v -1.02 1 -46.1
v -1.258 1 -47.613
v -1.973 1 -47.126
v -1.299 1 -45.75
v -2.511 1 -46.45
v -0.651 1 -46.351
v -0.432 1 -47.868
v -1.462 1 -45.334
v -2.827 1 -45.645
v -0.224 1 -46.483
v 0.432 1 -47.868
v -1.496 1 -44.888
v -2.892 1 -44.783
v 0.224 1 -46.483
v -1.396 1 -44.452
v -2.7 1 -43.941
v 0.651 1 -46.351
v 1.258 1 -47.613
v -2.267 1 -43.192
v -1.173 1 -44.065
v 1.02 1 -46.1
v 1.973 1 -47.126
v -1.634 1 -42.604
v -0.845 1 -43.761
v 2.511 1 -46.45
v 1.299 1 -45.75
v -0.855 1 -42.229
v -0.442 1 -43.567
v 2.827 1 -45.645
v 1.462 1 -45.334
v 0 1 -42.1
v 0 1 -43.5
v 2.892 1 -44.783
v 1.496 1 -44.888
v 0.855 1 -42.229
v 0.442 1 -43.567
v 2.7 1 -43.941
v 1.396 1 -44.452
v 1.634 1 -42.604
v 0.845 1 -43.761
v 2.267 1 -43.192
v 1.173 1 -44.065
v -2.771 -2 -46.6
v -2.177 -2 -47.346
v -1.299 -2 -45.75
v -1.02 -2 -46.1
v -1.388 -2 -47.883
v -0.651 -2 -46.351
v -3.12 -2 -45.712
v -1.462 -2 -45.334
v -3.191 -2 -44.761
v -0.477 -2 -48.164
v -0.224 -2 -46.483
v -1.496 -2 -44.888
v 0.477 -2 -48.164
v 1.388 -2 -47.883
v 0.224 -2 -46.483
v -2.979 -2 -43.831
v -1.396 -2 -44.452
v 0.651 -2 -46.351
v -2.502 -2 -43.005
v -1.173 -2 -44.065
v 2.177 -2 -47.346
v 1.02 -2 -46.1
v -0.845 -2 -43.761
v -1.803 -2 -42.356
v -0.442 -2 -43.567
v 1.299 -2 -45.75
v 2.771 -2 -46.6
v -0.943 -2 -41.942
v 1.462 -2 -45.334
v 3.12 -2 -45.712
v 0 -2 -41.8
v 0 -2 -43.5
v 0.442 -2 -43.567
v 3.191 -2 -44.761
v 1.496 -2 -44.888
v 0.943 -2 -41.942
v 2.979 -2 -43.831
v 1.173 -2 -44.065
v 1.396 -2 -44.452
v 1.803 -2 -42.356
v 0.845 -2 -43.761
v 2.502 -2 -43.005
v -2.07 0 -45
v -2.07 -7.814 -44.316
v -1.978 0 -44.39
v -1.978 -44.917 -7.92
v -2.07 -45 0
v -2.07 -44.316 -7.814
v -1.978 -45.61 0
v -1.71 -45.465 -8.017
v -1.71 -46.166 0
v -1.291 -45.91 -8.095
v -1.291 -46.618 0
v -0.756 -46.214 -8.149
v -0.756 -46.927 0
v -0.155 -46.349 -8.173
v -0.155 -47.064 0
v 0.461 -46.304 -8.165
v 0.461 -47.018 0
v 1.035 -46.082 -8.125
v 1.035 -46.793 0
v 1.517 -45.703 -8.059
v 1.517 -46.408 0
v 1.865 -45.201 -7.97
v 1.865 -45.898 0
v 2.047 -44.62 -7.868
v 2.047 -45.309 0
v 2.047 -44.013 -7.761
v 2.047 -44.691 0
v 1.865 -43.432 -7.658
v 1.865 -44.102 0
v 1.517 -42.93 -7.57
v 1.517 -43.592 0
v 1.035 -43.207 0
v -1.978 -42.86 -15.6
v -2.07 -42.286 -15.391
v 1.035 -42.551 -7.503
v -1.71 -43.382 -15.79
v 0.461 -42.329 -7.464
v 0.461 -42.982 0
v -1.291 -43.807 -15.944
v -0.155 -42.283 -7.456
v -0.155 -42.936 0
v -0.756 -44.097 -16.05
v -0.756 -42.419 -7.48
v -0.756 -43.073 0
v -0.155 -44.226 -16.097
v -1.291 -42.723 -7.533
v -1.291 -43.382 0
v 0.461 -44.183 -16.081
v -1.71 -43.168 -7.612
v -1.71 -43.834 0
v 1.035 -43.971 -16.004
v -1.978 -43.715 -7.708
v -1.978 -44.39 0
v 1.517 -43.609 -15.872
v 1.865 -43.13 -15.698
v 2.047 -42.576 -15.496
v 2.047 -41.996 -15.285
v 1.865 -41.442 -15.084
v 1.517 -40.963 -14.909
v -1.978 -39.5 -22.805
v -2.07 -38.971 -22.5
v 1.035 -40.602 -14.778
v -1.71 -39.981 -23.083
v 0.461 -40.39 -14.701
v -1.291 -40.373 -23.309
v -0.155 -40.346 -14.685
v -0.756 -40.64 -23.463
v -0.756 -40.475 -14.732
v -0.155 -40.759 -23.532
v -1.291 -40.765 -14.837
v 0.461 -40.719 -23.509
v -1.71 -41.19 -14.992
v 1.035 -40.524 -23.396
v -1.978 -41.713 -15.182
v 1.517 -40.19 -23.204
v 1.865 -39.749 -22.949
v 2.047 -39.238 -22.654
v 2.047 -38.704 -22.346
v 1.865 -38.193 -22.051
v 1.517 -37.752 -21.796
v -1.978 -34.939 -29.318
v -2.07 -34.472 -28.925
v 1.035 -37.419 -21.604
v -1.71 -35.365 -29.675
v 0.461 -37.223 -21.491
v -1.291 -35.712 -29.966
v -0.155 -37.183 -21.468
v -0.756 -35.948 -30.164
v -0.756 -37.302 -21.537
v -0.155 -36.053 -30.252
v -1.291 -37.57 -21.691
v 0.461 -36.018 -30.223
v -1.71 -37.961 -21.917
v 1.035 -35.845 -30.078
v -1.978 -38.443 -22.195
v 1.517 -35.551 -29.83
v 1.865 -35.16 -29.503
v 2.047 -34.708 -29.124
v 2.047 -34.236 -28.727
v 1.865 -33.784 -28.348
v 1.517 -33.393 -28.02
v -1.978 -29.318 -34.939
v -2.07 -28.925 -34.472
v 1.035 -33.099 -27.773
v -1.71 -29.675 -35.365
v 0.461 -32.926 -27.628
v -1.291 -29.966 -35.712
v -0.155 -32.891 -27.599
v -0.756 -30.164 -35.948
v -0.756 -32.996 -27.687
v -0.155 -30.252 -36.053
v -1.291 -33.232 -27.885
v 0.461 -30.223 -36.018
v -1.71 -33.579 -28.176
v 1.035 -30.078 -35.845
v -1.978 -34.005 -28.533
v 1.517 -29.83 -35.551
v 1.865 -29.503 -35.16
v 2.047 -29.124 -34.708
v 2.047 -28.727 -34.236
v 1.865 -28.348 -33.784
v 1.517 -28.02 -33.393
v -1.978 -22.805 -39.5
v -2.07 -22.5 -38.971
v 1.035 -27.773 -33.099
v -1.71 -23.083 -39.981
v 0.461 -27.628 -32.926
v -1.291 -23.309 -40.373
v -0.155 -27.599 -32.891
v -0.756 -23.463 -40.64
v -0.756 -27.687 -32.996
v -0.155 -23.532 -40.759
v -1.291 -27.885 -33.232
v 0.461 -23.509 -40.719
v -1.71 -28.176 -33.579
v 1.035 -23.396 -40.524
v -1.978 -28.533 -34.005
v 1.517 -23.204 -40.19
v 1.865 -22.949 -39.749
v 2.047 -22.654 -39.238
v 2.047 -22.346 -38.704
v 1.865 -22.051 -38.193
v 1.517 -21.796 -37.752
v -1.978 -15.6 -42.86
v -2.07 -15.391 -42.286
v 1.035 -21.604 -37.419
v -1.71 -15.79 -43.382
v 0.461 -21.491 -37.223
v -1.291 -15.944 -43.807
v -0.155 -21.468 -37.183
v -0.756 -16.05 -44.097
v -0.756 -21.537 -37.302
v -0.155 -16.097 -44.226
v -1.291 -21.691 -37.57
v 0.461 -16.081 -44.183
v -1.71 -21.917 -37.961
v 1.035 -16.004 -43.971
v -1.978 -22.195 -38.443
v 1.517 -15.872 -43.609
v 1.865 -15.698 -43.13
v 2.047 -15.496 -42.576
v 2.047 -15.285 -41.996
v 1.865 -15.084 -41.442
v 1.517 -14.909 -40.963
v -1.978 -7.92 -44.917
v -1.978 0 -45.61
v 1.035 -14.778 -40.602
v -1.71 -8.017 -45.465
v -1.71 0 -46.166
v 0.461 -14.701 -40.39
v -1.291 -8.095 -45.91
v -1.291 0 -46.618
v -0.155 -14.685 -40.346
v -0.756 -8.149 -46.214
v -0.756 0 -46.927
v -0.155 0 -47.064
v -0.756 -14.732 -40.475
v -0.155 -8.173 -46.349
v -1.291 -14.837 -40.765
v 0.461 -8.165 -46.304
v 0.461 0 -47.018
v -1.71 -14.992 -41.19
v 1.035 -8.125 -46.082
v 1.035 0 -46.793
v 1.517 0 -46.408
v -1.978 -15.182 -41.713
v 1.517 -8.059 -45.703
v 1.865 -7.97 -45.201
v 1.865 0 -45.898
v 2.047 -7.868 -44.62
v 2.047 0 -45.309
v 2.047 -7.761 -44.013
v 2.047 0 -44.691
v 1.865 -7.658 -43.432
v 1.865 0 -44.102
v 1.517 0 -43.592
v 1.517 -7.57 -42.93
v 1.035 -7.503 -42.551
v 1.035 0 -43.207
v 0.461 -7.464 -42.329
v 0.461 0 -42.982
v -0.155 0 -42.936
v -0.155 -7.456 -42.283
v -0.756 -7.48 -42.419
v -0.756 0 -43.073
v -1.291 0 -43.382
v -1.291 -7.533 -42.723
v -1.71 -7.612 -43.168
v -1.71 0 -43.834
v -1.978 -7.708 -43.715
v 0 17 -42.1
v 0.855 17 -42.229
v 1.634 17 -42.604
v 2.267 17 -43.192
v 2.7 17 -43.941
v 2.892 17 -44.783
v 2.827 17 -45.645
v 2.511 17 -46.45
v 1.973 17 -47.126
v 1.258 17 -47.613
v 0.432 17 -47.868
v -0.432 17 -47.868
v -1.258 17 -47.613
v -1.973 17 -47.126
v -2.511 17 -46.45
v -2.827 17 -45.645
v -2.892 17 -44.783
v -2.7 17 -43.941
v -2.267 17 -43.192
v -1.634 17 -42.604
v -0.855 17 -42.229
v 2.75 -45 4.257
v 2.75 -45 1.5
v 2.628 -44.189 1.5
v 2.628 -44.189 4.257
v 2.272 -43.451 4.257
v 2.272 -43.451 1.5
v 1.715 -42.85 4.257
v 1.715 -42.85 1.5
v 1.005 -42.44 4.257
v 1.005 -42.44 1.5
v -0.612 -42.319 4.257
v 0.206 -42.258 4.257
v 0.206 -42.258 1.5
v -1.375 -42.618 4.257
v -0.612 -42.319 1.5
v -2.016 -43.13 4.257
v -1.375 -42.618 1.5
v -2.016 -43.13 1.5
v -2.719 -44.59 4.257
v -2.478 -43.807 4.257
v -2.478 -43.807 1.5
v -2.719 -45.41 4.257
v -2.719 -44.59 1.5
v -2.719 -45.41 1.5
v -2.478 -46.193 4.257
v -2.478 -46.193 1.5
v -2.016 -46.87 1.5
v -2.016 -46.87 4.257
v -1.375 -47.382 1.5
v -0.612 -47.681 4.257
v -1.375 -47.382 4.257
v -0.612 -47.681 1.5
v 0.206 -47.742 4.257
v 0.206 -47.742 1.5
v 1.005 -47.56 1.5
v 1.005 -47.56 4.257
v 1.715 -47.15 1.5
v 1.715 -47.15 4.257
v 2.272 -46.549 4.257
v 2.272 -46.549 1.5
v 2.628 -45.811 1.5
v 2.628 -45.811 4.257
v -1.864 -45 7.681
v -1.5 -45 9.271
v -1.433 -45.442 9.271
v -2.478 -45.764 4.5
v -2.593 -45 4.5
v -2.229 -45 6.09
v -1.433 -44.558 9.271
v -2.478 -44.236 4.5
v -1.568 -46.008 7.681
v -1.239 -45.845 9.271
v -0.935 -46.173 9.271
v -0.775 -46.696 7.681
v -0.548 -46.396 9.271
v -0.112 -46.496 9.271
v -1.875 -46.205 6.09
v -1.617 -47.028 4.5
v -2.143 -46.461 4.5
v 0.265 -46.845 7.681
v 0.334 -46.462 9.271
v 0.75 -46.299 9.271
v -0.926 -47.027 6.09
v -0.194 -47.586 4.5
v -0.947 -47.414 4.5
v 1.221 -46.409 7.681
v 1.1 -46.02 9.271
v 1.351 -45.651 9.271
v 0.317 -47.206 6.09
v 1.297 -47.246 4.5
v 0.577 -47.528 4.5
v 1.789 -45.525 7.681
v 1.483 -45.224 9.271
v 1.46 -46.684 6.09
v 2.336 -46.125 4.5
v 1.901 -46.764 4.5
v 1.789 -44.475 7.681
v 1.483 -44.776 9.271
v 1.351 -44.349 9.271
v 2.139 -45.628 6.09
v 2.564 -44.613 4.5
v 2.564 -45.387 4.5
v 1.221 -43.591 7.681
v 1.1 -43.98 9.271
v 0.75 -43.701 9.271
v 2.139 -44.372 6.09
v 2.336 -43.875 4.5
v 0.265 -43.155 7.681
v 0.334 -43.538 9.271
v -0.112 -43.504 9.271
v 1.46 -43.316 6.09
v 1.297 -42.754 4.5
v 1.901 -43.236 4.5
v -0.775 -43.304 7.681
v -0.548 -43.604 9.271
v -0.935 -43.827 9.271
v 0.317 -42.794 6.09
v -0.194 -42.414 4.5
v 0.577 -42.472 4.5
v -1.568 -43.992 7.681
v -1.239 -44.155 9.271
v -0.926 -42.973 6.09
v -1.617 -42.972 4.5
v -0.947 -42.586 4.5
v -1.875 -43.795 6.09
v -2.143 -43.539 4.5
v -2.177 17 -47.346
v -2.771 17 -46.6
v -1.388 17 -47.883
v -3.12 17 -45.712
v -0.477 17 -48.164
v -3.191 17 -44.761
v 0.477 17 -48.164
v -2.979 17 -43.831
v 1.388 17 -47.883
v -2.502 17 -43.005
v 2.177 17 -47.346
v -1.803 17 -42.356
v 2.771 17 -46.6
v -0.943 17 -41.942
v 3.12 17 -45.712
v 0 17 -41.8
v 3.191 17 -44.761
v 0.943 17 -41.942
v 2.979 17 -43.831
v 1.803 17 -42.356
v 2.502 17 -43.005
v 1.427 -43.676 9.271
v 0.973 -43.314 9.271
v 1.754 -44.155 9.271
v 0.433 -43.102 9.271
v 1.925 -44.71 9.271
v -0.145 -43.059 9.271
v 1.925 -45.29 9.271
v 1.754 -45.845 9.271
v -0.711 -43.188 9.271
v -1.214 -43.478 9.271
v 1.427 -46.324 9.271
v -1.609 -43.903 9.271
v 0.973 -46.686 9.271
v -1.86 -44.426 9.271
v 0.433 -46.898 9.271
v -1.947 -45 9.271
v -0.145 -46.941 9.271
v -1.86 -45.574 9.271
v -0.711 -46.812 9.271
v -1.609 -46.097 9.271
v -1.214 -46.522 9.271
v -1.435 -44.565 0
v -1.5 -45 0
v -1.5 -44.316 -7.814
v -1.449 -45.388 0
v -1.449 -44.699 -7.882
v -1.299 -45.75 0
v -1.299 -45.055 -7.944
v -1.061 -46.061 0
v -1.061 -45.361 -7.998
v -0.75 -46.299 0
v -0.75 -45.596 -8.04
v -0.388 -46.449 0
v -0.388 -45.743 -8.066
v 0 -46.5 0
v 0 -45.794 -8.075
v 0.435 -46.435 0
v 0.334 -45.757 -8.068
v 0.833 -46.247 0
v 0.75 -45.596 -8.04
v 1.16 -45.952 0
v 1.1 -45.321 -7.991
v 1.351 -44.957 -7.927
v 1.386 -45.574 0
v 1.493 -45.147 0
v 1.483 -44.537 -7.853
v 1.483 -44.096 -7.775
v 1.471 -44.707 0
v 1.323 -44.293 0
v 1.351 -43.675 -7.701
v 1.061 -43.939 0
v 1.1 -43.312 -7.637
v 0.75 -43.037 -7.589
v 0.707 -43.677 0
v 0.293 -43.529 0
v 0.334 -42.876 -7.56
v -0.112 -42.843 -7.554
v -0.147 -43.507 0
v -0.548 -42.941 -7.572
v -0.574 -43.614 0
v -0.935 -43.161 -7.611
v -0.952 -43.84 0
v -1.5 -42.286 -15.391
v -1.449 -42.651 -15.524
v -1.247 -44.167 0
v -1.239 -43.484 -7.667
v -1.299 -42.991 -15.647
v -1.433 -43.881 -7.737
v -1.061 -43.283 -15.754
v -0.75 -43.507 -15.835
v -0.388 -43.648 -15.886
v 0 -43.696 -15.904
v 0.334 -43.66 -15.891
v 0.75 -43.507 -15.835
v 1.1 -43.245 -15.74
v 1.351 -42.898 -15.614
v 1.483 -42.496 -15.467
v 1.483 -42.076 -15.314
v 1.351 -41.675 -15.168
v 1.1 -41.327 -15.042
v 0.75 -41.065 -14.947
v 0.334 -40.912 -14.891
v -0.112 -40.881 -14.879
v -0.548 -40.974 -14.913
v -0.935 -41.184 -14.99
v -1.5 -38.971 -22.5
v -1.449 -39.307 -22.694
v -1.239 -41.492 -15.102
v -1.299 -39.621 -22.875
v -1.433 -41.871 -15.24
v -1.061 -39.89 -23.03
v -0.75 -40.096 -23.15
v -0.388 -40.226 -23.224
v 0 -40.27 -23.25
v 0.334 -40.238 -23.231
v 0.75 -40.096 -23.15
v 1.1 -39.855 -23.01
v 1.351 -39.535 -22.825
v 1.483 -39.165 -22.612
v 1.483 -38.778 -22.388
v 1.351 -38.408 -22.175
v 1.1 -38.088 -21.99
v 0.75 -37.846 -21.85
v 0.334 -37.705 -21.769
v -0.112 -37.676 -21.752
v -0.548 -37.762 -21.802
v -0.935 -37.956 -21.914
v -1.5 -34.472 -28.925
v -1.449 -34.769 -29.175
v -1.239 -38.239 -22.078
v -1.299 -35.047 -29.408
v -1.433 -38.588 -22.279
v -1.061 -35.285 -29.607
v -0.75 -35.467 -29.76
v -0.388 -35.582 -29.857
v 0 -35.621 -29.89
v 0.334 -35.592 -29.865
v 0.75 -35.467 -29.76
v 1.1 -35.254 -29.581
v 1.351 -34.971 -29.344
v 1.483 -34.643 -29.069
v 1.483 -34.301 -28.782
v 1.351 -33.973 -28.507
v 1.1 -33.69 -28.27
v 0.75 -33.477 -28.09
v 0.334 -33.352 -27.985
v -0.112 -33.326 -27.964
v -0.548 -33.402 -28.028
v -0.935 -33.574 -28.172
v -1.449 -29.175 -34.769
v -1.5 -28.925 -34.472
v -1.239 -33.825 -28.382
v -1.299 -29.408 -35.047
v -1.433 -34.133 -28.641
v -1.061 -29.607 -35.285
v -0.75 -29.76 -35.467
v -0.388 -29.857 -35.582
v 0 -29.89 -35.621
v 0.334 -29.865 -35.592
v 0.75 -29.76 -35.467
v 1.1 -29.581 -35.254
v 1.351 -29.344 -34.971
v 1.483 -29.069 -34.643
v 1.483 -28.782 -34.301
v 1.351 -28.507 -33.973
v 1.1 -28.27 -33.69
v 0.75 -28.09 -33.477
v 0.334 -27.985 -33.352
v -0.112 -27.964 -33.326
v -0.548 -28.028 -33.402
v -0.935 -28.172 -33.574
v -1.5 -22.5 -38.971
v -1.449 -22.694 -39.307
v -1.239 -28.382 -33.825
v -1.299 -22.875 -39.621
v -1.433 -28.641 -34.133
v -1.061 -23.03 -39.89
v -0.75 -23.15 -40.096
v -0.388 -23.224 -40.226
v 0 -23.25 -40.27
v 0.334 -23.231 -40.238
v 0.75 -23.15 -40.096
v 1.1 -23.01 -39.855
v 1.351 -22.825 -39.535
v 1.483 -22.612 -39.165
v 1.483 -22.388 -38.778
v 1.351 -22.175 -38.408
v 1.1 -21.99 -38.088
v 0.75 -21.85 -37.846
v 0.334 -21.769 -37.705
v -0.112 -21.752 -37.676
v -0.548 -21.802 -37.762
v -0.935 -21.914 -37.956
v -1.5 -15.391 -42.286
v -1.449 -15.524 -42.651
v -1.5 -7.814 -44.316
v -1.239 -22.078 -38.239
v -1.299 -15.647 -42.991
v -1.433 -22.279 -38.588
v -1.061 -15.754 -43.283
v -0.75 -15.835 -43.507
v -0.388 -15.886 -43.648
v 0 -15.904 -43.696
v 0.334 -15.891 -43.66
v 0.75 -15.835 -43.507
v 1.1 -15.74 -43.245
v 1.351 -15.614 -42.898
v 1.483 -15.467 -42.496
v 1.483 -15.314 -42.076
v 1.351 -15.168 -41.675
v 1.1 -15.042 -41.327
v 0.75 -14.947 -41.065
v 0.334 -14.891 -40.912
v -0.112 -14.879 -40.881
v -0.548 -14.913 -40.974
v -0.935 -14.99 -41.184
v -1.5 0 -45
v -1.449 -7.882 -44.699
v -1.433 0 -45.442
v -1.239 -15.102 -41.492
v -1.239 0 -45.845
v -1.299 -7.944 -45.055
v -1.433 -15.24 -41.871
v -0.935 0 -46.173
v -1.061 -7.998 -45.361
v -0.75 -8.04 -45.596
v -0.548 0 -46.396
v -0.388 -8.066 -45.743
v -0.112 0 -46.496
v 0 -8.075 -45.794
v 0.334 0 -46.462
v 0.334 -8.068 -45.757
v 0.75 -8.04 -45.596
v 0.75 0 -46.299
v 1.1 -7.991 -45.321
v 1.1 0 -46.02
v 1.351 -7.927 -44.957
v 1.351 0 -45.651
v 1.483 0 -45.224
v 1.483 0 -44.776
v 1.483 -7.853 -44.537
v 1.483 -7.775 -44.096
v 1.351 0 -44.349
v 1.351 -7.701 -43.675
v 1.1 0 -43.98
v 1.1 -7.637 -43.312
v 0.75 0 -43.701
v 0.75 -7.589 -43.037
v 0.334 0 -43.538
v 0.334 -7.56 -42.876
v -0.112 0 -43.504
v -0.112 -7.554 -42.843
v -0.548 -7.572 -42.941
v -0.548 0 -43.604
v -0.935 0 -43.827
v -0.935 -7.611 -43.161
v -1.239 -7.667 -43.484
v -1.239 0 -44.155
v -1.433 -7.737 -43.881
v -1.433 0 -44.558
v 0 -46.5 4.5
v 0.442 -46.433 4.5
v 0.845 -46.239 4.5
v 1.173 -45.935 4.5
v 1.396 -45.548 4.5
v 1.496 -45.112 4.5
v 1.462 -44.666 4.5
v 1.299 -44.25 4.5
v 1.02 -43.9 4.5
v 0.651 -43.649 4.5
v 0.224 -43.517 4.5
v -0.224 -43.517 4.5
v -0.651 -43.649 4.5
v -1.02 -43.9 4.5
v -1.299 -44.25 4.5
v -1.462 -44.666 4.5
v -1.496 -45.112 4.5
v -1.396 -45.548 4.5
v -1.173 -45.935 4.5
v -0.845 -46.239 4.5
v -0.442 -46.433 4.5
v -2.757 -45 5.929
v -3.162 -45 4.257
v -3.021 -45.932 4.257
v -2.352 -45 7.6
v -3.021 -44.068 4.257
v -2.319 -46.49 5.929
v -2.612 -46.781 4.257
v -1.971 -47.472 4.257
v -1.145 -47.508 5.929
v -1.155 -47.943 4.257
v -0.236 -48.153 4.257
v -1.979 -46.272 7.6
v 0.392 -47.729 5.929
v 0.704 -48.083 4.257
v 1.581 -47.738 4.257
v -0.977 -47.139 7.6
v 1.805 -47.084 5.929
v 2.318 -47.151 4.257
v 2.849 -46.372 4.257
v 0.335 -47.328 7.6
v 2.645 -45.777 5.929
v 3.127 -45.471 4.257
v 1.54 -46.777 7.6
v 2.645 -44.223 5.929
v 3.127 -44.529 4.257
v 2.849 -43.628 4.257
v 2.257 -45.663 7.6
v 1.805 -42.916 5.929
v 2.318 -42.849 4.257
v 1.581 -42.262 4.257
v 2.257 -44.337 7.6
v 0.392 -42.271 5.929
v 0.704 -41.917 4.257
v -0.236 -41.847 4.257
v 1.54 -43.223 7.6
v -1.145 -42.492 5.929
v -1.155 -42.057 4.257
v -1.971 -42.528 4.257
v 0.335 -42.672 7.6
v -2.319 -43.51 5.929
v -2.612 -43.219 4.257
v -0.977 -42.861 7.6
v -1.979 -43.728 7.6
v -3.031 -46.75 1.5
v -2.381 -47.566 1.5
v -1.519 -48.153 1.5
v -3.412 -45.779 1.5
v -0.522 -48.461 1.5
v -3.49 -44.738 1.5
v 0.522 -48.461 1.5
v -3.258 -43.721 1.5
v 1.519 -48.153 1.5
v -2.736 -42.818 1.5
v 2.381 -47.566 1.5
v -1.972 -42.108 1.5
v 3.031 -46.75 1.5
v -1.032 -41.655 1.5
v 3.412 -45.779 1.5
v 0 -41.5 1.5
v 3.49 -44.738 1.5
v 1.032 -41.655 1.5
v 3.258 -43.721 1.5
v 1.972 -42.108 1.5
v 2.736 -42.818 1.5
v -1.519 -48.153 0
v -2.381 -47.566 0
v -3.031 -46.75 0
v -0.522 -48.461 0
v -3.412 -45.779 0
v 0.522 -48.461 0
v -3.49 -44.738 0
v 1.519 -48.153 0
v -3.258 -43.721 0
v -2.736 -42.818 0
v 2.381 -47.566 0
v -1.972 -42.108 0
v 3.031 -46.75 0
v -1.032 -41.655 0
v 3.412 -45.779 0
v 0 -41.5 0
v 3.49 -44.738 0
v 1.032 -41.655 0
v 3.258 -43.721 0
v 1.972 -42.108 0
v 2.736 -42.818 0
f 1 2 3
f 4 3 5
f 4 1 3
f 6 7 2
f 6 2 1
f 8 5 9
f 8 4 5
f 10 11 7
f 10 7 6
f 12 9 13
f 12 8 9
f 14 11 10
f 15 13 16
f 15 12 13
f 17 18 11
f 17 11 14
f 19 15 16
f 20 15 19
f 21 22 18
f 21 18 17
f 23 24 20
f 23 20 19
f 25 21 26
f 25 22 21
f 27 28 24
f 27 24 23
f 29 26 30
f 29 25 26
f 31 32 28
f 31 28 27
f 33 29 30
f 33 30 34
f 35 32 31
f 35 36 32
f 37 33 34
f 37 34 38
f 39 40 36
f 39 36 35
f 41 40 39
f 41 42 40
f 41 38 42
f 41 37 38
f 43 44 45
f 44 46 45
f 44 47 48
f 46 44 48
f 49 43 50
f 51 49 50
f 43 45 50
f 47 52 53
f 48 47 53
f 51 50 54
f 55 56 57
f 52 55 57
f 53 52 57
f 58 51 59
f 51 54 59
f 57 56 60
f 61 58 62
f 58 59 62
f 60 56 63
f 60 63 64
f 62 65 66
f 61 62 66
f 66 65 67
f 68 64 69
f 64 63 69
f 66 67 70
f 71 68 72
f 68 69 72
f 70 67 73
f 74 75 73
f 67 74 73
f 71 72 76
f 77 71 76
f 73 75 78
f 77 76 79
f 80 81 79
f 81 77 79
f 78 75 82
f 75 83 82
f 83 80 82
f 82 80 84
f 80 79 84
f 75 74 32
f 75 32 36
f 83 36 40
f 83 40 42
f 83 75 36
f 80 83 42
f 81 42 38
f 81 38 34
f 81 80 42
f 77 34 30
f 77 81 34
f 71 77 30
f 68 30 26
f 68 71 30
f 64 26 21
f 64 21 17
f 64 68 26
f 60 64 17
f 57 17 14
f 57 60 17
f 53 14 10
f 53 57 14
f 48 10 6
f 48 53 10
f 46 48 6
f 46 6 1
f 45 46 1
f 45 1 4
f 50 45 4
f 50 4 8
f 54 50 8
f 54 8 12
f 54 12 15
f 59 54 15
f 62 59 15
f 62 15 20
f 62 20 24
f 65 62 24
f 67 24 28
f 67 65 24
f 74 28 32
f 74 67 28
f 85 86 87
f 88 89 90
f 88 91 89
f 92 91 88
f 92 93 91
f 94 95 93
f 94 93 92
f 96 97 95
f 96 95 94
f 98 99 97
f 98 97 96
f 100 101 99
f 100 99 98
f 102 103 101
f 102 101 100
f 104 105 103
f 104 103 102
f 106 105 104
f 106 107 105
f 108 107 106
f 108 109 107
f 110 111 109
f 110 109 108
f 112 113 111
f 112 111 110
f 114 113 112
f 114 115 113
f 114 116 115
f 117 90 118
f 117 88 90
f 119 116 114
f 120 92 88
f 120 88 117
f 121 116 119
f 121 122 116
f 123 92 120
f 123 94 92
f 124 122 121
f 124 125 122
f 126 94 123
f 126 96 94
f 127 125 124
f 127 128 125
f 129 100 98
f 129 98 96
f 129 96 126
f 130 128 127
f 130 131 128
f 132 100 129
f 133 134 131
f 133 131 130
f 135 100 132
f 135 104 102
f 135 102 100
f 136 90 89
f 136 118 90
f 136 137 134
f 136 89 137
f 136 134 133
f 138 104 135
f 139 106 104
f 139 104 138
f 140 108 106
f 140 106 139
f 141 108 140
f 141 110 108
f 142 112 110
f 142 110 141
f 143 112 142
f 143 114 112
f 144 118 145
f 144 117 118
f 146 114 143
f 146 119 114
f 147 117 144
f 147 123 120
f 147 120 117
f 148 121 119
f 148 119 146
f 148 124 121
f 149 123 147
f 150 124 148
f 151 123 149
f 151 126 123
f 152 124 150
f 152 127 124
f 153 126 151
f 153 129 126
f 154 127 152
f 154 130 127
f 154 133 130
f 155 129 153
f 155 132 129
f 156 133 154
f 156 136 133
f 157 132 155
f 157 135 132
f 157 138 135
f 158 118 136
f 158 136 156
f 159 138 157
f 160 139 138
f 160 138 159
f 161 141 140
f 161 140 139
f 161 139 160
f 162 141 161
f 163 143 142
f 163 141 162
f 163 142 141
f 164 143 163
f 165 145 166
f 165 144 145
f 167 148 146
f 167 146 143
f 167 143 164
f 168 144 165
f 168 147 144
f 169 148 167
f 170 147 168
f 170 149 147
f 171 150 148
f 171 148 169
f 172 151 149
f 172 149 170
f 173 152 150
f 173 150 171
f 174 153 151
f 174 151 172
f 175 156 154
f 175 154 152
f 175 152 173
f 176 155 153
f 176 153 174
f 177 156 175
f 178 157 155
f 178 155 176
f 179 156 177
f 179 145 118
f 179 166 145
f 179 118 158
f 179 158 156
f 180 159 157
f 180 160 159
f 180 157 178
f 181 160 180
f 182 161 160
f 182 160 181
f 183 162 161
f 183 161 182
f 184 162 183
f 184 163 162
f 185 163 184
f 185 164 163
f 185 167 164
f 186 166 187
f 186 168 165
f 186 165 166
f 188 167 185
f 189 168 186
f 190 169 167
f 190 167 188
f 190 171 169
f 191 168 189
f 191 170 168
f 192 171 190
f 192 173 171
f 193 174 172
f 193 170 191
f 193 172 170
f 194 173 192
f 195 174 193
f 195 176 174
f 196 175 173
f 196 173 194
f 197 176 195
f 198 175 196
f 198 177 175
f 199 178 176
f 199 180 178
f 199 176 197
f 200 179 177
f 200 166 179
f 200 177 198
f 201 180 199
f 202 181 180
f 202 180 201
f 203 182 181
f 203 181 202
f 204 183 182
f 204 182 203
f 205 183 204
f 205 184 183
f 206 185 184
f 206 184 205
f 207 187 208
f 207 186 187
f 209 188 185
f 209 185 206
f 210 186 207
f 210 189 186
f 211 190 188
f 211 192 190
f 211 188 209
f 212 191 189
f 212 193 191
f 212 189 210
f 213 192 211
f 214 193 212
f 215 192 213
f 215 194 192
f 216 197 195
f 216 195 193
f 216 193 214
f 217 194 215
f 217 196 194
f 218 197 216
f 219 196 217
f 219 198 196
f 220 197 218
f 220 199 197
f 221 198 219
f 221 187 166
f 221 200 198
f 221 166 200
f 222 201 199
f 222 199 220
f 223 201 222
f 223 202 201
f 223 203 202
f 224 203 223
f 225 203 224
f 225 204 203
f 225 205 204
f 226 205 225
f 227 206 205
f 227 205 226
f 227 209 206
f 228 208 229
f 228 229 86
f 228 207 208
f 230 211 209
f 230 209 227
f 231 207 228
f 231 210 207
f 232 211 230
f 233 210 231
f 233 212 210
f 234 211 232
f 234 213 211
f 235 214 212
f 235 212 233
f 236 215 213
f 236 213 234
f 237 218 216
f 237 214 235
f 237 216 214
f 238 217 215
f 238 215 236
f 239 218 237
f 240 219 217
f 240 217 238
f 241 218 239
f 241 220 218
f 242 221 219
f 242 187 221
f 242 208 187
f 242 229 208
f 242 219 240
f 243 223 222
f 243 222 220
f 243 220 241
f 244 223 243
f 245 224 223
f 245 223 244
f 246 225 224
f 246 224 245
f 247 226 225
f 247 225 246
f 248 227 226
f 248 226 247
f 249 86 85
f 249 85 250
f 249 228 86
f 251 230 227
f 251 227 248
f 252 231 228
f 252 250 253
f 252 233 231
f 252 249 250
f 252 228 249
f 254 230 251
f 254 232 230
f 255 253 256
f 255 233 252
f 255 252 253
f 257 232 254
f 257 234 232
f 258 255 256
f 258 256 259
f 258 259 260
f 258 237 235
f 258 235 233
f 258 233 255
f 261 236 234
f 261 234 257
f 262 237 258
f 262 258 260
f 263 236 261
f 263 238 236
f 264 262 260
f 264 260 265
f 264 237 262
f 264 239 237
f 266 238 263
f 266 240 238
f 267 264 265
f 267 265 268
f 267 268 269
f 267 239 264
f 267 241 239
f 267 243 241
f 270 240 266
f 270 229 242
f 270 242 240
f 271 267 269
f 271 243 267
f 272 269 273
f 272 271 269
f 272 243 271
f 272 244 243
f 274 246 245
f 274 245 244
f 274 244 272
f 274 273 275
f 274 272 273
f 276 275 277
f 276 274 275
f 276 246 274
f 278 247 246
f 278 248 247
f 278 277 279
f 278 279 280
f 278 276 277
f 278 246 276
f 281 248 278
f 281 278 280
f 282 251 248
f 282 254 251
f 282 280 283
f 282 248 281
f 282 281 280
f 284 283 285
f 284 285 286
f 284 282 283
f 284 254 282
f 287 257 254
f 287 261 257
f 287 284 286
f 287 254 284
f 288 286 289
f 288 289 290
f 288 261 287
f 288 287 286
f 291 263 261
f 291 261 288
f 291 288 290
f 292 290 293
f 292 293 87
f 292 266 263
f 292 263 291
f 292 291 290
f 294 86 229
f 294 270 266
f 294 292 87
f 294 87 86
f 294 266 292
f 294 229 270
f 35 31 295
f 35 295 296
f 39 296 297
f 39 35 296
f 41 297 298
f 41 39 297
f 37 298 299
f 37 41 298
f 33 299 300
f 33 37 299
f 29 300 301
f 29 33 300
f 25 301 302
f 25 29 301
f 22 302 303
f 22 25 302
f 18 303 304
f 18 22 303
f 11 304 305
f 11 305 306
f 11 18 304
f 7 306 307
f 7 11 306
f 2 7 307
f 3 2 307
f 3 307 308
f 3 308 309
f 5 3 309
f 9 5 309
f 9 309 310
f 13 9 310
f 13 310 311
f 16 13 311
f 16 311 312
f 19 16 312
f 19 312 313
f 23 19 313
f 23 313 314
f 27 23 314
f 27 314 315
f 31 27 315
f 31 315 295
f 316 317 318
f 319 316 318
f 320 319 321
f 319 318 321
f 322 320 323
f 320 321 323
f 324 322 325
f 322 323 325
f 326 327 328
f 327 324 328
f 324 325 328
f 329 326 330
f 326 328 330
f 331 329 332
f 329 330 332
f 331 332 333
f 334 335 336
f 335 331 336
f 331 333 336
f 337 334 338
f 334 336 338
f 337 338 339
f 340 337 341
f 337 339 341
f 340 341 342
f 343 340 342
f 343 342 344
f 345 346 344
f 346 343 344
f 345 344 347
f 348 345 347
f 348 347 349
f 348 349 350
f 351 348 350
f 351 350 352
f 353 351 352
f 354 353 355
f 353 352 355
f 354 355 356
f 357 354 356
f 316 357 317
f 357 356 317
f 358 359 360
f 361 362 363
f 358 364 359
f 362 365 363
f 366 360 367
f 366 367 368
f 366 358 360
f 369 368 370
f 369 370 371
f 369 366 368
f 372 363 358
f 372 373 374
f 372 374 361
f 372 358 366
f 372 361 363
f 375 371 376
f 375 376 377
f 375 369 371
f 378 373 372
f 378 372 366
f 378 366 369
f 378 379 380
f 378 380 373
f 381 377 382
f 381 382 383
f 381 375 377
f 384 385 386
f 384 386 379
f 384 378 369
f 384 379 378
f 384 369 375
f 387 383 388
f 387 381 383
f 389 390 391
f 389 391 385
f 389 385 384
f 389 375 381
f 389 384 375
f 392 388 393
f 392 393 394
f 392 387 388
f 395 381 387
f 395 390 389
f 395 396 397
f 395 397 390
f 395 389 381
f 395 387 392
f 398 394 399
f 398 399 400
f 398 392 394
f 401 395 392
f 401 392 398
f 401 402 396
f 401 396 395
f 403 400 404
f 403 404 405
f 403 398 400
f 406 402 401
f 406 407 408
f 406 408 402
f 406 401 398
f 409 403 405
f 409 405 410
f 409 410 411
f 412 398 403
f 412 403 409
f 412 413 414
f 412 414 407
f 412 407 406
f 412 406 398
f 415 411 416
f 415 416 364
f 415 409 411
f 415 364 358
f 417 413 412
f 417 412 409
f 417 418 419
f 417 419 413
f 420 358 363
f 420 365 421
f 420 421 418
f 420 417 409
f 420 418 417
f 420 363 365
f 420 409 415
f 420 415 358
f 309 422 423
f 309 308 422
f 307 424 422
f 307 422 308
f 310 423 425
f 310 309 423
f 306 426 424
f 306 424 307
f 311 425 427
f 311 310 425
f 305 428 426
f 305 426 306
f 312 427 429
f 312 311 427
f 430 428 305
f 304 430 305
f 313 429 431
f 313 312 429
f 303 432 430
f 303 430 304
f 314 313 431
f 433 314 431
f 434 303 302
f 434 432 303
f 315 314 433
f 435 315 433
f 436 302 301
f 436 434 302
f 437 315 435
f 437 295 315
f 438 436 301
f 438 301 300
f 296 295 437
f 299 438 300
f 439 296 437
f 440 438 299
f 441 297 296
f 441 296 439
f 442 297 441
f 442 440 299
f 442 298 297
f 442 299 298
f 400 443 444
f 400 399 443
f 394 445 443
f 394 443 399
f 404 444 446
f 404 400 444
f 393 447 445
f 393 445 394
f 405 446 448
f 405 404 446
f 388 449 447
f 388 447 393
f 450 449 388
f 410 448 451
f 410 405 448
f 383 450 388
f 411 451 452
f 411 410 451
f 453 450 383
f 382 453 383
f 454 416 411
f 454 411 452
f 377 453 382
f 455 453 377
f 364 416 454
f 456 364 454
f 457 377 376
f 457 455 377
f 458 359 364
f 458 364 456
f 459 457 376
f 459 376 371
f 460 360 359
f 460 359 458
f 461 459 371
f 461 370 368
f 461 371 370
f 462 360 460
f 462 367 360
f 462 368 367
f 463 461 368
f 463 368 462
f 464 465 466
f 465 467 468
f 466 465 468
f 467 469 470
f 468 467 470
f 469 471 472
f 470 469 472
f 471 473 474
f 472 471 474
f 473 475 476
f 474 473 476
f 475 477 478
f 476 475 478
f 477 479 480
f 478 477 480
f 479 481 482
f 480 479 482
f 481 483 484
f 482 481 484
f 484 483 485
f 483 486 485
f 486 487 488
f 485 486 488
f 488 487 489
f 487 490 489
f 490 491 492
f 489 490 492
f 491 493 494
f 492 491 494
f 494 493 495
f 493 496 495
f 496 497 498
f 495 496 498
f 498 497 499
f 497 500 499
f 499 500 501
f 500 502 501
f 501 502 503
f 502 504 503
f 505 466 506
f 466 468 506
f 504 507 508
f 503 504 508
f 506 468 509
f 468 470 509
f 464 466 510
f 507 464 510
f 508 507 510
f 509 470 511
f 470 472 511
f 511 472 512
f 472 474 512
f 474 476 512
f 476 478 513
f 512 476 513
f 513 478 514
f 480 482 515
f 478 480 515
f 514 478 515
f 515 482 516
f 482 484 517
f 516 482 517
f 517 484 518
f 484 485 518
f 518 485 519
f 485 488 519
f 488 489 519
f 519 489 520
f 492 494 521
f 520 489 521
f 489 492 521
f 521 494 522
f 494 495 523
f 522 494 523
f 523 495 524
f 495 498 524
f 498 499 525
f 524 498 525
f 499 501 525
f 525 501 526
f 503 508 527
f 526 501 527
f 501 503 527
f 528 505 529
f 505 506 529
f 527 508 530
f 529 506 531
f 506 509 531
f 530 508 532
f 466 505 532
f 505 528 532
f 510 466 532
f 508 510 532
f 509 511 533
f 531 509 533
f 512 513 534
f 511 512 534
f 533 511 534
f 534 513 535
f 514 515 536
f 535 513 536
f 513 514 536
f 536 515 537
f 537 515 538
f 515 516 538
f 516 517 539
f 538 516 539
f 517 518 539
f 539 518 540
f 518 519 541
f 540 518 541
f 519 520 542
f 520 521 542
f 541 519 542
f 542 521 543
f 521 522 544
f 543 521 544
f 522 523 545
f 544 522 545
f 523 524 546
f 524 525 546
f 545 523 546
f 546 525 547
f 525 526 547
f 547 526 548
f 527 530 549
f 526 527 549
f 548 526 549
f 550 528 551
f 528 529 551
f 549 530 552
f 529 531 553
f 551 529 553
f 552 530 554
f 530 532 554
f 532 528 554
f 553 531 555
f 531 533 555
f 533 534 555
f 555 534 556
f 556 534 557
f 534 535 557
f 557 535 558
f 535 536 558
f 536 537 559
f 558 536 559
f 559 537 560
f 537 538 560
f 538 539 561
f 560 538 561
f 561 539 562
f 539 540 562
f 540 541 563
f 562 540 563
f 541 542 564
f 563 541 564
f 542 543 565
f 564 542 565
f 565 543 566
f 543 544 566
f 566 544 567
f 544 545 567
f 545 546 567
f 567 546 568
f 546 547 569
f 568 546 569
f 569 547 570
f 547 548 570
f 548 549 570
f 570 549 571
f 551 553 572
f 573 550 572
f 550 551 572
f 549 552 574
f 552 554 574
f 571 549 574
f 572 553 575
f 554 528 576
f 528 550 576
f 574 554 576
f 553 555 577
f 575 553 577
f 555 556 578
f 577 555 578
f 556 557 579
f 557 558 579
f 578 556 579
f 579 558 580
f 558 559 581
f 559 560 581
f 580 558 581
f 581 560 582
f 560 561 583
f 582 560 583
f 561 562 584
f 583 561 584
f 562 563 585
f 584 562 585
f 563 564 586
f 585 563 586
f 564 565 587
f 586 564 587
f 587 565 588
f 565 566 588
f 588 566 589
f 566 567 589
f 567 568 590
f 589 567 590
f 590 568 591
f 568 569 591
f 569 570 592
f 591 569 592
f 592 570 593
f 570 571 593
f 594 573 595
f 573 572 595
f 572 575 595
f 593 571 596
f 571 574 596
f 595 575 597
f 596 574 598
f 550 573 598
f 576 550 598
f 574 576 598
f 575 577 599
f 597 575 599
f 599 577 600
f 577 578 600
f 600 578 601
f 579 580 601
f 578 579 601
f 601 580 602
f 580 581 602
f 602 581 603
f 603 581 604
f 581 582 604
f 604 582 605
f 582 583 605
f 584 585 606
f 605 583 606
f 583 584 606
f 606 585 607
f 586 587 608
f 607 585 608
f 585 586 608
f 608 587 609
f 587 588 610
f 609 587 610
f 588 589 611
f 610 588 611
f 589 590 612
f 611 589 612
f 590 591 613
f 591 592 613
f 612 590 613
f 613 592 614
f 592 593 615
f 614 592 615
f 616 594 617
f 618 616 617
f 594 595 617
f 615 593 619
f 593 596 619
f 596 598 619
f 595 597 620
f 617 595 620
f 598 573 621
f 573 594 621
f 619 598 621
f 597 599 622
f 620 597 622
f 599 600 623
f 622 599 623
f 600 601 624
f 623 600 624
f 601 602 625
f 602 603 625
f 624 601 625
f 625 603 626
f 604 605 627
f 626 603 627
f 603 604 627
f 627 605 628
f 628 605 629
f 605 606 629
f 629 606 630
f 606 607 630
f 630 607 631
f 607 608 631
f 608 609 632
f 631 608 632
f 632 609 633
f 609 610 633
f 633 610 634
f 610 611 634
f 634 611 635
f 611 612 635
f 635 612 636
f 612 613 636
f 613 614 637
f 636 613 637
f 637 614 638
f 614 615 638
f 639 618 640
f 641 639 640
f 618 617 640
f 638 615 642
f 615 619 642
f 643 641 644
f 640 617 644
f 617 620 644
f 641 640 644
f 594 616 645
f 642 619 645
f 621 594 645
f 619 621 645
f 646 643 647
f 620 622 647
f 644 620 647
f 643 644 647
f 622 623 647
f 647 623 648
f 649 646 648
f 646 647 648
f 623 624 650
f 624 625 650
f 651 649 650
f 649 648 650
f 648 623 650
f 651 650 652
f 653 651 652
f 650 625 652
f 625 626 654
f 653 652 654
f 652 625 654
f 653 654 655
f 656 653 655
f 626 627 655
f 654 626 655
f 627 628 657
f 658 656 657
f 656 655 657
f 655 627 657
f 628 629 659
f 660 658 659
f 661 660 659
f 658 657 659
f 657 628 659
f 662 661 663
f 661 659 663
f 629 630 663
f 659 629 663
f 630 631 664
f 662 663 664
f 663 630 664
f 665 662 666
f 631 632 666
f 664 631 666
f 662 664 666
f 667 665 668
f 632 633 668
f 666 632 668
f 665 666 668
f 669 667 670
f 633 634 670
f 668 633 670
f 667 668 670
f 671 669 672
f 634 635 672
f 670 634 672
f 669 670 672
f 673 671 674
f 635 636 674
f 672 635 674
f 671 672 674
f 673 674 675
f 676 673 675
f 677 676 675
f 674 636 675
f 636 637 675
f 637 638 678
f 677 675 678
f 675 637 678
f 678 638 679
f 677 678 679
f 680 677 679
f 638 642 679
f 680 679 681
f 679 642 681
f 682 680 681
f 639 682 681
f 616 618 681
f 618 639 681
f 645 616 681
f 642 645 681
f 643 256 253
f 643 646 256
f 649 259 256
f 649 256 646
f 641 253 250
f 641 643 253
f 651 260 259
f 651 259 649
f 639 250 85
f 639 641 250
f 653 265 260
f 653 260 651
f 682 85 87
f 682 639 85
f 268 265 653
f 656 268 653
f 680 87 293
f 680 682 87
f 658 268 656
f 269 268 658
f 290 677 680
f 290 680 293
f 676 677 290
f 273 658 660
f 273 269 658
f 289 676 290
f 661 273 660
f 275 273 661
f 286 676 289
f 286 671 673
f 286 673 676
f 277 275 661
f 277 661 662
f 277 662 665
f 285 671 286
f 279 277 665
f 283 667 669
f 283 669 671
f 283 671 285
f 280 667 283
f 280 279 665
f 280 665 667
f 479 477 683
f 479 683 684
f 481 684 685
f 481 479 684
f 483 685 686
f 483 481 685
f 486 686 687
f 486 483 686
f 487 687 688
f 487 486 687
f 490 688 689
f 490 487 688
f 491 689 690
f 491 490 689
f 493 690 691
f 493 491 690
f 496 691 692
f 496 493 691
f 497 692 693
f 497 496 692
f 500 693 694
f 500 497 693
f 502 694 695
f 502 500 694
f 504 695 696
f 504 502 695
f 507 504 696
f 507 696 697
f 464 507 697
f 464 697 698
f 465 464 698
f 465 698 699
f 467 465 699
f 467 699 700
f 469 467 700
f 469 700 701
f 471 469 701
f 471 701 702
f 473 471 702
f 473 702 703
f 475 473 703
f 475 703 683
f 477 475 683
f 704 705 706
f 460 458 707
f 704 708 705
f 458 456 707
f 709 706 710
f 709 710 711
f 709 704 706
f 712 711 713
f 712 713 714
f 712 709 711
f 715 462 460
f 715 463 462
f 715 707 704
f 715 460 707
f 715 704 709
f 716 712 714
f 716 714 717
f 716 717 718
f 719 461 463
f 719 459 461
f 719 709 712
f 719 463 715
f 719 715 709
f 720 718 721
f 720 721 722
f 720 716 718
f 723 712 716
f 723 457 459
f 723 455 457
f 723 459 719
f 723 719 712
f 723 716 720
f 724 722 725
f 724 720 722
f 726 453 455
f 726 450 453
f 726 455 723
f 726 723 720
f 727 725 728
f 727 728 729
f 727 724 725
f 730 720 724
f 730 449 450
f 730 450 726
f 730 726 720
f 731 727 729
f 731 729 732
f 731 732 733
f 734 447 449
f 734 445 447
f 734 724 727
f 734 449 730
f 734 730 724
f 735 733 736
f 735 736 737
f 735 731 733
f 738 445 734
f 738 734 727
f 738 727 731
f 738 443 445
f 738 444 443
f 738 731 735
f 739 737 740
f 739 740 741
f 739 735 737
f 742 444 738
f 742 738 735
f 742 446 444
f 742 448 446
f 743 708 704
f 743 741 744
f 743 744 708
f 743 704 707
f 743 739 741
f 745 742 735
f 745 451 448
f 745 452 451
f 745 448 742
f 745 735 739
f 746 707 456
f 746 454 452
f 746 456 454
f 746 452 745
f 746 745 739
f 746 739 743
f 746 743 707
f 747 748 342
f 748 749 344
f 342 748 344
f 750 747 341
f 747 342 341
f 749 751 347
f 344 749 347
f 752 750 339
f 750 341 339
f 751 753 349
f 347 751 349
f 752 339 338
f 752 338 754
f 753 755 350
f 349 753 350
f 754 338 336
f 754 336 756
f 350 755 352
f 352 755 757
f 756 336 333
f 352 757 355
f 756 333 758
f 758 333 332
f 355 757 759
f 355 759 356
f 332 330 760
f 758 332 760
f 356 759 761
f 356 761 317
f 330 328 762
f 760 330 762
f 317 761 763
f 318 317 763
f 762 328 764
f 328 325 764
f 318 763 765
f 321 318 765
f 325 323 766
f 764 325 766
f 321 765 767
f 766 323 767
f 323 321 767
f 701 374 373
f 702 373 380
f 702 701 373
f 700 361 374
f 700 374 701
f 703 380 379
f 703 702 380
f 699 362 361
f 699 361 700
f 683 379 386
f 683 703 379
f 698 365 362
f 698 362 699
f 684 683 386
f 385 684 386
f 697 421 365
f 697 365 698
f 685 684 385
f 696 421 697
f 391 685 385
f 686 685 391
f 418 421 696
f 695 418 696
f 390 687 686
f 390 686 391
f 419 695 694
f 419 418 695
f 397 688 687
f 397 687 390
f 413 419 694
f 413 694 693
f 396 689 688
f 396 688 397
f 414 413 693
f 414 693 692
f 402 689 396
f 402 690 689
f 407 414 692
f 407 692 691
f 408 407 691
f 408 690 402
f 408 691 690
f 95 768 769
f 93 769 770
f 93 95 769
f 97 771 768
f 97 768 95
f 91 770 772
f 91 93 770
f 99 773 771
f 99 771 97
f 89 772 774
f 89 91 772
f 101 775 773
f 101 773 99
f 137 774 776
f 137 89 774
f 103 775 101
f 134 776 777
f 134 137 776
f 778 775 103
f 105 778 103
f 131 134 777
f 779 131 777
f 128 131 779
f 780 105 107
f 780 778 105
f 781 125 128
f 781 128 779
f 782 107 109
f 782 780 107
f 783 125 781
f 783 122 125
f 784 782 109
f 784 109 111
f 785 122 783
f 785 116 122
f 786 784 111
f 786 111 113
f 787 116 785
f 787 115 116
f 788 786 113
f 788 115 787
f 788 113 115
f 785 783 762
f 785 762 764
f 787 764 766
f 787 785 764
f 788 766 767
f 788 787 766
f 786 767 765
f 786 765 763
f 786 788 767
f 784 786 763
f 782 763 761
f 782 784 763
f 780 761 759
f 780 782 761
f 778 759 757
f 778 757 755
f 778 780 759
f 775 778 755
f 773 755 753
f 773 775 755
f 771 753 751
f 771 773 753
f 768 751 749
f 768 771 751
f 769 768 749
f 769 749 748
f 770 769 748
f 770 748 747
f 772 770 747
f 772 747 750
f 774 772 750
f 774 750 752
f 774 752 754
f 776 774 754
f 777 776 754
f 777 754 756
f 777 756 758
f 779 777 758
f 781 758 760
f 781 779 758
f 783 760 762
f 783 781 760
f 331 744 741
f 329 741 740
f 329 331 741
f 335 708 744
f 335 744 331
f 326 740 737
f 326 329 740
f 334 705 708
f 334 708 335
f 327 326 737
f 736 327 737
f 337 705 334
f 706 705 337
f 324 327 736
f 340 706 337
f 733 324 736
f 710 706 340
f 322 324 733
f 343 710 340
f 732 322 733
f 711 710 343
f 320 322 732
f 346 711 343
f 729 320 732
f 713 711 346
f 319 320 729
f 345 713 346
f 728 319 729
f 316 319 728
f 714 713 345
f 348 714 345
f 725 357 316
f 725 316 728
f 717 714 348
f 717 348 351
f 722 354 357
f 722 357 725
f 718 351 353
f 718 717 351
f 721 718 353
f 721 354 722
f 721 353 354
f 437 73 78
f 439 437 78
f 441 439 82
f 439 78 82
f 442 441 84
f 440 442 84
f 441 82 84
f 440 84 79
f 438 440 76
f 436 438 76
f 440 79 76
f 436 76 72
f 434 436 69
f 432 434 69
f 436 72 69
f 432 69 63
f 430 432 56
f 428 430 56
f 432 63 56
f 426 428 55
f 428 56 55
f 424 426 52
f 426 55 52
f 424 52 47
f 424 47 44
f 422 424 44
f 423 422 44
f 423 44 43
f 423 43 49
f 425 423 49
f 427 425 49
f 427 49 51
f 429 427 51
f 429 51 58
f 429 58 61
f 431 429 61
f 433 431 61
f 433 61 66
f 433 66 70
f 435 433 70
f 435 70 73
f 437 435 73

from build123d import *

# Parameters (mm, degrees)
SKETCH2_R                = 2.07
SKETCH2_R_2              = 1.5
SKETCH3_R                = 2.75
SKETCH3_R_2              = 1.5
BOSS_EXTRUDE1_DEPTH      = 4.5
SKETCH4_R                = 3.5
SKETCH4_R_2              = 2.5
BOSS_EXTRUDE2_DEPTH      = 1.5
BOSS_EXTRUDE3_DEPTH      = 1
BOSS_EXTRUDE3_DEPTH_BACK = 2
SKETCH5_R                = 3.2
SKETCH5_R_2              = 1.5
BOSS_EXTRUDE6_DEPTH      = 16
BOSS_EXTRUDE6_DEPTH_BACK = 1
SKETCH10_R               = 3.2
SKETCH10_R_2             = 2.9


with BuildPart() as part:
    # Sweep-Thin1: sweep along a path in Sketch1
    with BuildLine(Plane(origin=(0, 0, 0), x_dir=(0, 0, -1), z_dir=(1, 0, 0))) as sweep_thin1_path:
        ThreePointArc((0, -45), (31.819805153, -31.819805153), (45, 0))
    # Sketch2 → Sweep-Thin1 (sweep)
    with BuildSketch(Plane(origin=(0, -45, 0), x_dir=(-1, 0, 0), z_dir=(0, 0, -1))):
        Circle(SKETCH2_R)
        Circle(SKETCH2_R_2, mode=Mode.SUBTRACT)
    sweep(path=sweep_thin1_path.line)

    # Sketch3 → Boss-Extrude1 (add)
    with BuildSketch(Plane.XY):
        with Locations((0, -45)):
            Circle(SKETCH3_R)
        with Locations(Location((0, -45, 0), (0, 0, 270))):
            Circle(SKETCH3_R_2, mode=Mode.SUBTRACT)
    extrude(amount=BOSS_EXTRUDE1_DEPTH)

    # Sketch4 → Boss-Extrude2 (add)
    with BuildSketch(Plane(origin=(0, -45, 0), x_dir=(-1, 0, 0), z_dir=(0, 0, -1))):
        with Locations(Location((0, 0, 0), (0, 0, 90))):
            Circle(SKETCH4_R)
        Circle(SKETCH4_R_2, mode=Mode.SUBTRACT)
    extrude(amount=-BOSS_EXTRUDE2_DEPTH)

    # Sketch8 → Revolve1 (revolve)
    with BuildSketch(Plane(origin=(0, 0, 0), x_dir=(0, 0, -1), z_dir=(1, 0, 0)), mode=Mode.PRIVATE) as revolve1_sk:
        Polygon((-4.25711996, -42.351079614), (-4.25711996, -41.838122818), (-9.271481687, -43.053091763), (-9.271481687, -43.5), align=None)
    revolve(revolve1_sk.sketch.rotate(Axis((0, -45, 4.5), (0, 0, 1)), 90), axis=Axis((0, -45, 4.5), (0, 0, 1)))


with BuildPart() as body_2:
    # Sketch5 → Boss-Extrude3 (new, two sides: drawn at the far end of the back side and taken through both)
    with BuildSketch(Plane(origin=(0, 0, 0), x_dir=(1, 0, 0), z_dir=(0, 1, 0)).offset(-BOSS_EXTRUDE3_DEPTH_BACK)):
        with Locations(Location((0, 45, 0), (0, 0, 270))):
            Circle(SKETCH5_R)
        with Locations(Location((0, 45, 0), (0, 0, 270))):
            Circle(SKETCH5_R_2, mode=Mode.SUBTRACT)
    extrude(amount=BOSS_EXTRUDE3_DEPTH + BOSS_EXTRUDE3_DEPTH_BACK)

    # Sketch10 → Boss-Extrude6 (add, two sides: drawn at the far end of the back side and taken through both)
    with BuildSketch(Plane(origin=(0, 1, 0), x_dir=(1, 0, 0), z_dir=(0, 1, 0)).offset(-BOSS_EXTRUDE6_DEPTH_BACK)):
        with Locations(Location((0, 45, 0), (0, 0, 270))):
            Circle(SKETCH10_R)
        with Locations(Location((0, 45, 0), (0, 0, 270))):
            Circle(SKETCH10_R_2, mode=Mode.SUBTRACT)
    extrude(amount=BOSS_EXTRUDE6_DEPTH + BOSS_EXTRUDE6_DEPTH_BACK)


solid = Compound([part.part, body_2.part])
